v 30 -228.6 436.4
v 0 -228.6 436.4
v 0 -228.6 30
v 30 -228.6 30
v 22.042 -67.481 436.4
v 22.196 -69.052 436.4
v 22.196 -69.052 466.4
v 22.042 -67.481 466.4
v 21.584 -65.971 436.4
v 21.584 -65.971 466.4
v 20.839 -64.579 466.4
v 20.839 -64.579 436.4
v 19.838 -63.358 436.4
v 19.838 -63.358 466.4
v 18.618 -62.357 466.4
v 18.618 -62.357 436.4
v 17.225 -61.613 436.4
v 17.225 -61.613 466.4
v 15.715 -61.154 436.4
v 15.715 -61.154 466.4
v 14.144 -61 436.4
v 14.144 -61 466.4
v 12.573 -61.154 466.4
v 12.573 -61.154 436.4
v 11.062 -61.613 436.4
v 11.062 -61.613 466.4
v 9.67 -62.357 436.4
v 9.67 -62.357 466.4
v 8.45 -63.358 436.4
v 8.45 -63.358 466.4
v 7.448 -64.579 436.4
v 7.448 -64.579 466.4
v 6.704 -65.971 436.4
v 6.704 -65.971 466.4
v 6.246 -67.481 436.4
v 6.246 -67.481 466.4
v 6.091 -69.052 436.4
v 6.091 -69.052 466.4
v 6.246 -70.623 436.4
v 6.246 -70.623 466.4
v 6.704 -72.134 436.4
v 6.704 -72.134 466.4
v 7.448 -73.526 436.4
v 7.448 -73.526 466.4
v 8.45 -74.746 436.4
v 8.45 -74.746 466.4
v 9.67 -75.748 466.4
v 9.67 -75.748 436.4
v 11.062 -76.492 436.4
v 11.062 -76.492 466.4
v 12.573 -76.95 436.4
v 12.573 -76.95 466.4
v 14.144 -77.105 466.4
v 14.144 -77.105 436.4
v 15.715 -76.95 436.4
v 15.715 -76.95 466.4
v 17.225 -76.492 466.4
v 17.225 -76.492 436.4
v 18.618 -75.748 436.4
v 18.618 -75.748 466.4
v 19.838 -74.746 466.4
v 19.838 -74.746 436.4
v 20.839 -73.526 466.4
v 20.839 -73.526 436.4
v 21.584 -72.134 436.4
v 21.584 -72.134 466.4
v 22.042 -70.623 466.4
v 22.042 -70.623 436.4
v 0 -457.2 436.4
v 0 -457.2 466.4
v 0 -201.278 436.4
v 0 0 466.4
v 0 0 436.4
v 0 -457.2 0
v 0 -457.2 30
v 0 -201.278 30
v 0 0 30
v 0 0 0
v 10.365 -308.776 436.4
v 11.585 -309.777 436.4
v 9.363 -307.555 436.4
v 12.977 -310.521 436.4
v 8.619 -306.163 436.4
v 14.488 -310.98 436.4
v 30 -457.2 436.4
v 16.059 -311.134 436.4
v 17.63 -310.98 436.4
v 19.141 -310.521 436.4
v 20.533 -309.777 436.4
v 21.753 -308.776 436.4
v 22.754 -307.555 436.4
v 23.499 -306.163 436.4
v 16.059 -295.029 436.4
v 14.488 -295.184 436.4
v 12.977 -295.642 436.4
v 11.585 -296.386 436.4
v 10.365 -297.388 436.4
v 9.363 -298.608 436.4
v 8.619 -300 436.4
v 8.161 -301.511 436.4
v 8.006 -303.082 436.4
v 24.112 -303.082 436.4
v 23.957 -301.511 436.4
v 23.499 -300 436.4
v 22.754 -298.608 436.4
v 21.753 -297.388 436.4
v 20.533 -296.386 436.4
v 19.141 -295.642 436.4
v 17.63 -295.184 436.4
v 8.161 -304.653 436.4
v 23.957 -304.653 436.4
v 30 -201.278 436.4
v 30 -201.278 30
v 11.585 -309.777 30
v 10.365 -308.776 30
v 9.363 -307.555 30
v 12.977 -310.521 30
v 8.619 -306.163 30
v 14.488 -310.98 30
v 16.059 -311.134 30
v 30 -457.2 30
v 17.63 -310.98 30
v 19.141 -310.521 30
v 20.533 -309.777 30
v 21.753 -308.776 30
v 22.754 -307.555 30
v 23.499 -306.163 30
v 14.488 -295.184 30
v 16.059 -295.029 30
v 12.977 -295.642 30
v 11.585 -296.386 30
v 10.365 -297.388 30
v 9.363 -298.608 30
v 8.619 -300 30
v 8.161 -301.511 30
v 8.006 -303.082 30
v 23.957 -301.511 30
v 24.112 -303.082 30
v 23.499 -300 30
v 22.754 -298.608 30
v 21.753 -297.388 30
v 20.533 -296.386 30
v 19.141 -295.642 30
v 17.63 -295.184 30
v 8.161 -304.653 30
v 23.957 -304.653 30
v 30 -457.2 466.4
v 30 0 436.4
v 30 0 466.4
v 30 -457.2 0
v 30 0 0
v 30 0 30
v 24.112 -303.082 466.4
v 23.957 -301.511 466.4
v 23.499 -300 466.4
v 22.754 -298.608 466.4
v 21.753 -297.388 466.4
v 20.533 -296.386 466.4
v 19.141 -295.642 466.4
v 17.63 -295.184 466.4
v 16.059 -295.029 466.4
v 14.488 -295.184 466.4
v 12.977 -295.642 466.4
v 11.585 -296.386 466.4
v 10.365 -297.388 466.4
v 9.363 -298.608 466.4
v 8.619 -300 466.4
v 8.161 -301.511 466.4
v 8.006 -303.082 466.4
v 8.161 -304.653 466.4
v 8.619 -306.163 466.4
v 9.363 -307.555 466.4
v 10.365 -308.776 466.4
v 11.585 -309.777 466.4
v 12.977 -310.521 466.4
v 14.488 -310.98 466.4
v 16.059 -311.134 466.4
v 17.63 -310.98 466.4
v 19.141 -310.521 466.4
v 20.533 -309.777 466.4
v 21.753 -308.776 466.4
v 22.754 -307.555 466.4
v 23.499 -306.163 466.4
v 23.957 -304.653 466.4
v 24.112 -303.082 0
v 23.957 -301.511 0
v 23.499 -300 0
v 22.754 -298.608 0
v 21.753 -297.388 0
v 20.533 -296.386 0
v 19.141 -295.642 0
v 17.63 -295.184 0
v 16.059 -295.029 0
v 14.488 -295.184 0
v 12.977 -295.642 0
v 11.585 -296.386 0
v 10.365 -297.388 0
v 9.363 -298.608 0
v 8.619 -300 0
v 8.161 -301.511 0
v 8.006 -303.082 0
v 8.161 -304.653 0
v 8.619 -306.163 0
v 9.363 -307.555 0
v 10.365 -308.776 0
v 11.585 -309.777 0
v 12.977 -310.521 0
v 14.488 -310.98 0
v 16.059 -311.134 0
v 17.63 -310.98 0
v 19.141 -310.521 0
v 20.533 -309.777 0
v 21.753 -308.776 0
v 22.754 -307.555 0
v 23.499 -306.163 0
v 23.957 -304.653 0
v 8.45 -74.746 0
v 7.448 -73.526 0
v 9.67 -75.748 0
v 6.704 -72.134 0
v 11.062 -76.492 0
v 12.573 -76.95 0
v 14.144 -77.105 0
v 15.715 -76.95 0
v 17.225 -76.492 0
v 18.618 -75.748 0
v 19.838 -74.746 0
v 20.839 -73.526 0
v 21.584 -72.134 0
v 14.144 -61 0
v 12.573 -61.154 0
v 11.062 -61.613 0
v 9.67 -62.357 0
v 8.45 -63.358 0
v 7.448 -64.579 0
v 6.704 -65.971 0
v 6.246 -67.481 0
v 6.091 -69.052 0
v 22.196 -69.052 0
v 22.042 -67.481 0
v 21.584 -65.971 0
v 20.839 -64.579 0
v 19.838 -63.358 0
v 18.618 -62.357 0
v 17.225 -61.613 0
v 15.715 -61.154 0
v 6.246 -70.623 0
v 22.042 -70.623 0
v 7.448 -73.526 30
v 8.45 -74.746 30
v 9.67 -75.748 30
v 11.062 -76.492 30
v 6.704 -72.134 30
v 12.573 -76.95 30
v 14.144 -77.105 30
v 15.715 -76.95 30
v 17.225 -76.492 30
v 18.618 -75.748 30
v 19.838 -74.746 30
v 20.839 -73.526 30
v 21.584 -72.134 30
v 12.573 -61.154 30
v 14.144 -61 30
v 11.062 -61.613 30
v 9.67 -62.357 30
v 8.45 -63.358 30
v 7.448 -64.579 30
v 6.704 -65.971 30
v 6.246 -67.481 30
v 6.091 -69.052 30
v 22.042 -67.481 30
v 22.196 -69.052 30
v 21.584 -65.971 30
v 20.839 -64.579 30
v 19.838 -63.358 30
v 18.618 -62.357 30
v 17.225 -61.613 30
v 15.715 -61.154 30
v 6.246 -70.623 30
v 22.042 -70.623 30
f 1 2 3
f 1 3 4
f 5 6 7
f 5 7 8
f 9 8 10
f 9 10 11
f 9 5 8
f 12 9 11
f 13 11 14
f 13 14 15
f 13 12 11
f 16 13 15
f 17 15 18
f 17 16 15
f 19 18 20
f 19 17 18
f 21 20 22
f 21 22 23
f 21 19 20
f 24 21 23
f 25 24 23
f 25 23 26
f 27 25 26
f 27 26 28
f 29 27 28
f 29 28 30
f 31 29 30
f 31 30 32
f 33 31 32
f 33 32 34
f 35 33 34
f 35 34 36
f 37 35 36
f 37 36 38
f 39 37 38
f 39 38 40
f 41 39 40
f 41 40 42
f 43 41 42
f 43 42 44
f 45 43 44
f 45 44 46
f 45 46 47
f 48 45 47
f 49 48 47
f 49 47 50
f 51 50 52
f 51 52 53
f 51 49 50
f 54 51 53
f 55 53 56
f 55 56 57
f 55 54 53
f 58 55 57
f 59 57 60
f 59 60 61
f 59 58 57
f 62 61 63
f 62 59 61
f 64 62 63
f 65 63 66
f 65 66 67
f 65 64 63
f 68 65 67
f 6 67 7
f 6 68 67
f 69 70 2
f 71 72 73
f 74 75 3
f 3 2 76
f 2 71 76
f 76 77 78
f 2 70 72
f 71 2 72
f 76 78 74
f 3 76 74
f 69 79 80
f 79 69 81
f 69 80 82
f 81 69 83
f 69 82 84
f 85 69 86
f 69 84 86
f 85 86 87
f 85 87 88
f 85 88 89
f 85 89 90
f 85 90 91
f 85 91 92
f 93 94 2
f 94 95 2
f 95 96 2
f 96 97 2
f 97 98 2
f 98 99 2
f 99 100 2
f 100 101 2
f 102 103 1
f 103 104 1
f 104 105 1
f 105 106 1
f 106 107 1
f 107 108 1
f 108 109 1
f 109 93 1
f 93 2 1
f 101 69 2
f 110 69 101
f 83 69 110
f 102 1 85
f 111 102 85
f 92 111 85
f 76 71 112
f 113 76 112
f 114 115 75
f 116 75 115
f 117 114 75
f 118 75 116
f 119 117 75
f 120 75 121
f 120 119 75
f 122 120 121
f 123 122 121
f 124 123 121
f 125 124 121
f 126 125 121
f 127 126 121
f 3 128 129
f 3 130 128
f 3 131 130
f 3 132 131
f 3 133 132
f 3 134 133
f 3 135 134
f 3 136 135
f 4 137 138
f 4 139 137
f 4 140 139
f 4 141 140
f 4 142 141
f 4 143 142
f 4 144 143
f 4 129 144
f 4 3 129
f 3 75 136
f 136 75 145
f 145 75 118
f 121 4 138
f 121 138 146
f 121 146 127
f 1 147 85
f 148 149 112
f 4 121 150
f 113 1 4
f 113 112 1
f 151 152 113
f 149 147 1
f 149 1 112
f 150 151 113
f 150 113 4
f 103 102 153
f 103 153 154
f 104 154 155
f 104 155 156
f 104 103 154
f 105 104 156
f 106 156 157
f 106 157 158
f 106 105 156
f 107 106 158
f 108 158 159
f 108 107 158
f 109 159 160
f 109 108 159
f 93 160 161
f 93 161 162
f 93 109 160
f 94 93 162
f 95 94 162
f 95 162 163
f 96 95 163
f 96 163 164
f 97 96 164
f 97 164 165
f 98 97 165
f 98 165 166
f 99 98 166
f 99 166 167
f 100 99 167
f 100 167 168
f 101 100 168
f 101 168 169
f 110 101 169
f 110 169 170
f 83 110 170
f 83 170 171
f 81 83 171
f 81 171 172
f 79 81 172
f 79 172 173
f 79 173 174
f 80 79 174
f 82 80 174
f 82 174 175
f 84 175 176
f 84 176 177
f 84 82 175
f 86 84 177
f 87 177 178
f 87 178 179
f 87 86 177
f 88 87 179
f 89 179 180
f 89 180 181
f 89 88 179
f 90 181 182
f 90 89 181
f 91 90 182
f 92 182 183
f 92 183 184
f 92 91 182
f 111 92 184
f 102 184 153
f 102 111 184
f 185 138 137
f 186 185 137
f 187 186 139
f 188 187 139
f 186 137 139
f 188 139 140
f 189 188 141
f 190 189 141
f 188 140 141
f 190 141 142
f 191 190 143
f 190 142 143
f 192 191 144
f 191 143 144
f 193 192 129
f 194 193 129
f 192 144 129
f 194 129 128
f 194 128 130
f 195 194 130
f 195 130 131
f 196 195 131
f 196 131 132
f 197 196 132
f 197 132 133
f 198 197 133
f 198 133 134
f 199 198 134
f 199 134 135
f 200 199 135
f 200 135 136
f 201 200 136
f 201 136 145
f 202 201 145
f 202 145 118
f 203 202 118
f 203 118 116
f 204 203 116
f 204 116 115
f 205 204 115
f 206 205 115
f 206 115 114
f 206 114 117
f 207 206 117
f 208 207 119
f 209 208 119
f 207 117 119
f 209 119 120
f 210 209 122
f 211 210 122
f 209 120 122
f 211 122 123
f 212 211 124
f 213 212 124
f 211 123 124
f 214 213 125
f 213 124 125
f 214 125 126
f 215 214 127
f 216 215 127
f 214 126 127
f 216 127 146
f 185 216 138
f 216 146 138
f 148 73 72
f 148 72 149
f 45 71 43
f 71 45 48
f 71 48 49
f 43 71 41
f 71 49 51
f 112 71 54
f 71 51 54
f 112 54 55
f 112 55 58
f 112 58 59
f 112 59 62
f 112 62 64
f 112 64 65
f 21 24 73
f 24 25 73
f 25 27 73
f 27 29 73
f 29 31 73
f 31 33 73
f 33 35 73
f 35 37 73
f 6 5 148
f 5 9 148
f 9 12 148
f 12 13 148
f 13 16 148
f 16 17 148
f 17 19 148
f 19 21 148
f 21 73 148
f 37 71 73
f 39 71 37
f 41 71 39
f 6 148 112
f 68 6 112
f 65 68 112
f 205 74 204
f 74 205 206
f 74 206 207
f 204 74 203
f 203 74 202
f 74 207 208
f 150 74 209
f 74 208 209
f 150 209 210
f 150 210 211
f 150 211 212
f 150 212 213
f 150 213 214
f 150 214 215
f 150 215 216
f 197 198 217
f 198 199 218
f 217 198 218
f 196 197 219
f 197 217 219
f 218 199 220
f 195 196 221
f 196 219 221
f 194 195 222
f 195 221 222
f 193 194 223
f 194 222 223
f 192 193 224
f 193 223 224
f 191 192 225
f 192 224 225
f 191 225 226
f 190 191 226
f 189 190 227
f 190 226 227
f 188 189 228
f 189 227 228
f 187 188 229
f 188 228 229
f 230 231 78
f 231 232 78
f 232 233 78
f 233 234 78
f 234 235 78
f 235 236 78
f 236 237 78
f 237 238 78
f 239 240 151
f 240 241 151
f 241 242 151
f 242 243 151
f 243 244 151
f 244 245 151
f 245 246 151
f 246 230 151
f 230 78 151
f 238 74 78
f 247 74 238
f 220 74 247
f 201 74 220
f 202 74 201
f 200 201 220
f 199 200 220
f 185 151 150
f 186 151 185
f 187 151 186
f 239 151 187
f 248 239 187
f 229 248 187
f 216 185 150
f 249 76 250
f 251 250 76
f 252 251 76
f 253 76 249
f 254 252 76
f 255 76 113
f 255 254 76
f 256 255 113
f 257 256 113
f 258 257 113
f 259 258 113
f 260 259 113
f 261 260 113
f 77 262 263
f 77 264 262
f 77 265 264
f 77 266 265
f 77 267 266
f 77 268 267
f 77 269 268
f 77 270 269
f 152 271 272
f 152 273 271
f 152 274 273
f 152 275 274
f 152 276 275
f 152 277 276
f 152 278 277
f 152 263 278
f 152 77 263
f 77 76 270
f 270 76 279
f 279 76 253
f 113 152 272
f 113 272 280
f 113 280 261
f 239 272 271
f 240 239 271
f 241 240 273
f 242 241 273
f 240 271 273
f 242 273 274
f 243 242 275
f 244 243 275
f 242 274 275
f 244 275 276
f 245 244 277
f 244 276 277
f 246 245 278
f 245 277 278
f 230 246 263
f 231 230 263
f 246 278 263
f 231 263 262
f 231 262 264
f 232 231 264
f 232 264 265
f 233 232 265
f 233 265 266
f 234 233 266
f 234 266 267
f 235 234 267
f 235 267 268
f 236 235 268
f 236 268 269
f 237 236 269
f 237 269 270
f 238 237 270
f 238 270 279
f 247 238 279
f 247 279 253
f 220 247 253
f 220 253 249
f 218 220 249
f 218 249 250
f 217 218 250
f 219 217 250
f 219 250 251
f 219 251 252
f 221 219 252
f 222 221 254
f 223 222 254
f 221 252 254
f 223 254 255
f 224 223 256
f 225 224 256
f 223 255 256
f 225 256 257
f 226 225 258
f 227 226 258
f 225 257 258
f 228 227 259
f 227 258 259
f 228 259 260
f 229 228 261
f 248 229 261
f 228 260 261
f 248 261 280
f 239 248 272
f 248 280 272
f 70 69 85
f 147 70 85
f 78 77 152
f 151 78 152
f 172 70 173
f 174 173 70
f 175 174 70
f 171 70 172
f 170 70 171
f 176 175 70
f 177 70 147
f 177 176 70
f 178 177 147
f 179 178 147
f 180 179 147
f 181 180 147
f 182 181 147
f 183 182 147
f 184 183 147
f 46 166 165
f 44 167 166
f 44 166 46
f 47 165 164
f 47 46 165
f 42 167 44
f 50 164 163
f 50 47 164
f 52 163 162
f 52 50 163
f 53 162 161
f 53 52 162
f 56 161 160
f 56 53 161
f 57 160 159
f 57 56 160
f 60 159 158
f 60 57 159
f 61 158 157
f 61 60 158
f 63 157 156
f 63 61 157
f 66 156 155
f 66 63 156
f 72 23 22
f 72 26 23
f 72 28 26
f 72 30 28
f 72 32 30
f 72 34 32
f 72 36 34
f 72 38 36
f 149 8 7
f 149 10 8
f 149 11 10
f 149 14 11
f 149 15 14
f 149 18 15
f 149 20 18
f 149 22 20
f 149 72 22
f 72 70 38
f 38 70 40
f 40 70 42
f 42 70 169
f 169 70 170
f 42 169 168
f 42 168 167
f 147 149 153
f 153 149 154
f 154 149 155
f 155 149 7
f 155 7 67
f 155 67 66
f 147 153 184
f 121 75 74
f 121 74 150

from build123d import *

# Parameters (mm, degrees)
F0_W     = 30
F0_H     = 30
F1_DEPTH = 457.2
F2_R     = 8.052642
F2_R_2   = 8.052679
F3_DEPTH = 30.001
F5_W     = 30
F5_H     = 27.321835
F6_DEPTH = 203.2


with BuildPart() as f1:
    # F0 (on Front) → F1 (new body)
    with BuildSketch(Plane.XZ):
        with Locations((15, 15)):
            Rectangle(F0_W, F0_H)
    extrude(amount=F1_DEPTH)

    # F2 (on face) → F3 (cut, through all)
    with BuildSketch(Plane.XY.offset(30)):
        with Locations((16.058933, -303.081602)):
            Circle(F2_R)
        with Locations((14.143813, -69.052368)):
            Circle(F2_R_2)
    extrude(amount=-F3_DEPTH, mode=Mode.SUBTRACT)

    # F5 (on face) → F6 (join)
    with BuildSketch(Plane.XY.offset(30)):
        with Locations((15, -214.939082)):
            Rectangle(F5_W, F5_H)
    extrude(amount=F6_DEPTH)

    # F7: F1 across plane


with BuildPart() as f1_1:
    add(f1.part)
    add(f1.part.mirror(Plane(origin=(14.996897, -229.902144, 233.2), x_dir=(1, 0, 0), z_dir=(0, 0, 1))))


solid = f1_1.part
